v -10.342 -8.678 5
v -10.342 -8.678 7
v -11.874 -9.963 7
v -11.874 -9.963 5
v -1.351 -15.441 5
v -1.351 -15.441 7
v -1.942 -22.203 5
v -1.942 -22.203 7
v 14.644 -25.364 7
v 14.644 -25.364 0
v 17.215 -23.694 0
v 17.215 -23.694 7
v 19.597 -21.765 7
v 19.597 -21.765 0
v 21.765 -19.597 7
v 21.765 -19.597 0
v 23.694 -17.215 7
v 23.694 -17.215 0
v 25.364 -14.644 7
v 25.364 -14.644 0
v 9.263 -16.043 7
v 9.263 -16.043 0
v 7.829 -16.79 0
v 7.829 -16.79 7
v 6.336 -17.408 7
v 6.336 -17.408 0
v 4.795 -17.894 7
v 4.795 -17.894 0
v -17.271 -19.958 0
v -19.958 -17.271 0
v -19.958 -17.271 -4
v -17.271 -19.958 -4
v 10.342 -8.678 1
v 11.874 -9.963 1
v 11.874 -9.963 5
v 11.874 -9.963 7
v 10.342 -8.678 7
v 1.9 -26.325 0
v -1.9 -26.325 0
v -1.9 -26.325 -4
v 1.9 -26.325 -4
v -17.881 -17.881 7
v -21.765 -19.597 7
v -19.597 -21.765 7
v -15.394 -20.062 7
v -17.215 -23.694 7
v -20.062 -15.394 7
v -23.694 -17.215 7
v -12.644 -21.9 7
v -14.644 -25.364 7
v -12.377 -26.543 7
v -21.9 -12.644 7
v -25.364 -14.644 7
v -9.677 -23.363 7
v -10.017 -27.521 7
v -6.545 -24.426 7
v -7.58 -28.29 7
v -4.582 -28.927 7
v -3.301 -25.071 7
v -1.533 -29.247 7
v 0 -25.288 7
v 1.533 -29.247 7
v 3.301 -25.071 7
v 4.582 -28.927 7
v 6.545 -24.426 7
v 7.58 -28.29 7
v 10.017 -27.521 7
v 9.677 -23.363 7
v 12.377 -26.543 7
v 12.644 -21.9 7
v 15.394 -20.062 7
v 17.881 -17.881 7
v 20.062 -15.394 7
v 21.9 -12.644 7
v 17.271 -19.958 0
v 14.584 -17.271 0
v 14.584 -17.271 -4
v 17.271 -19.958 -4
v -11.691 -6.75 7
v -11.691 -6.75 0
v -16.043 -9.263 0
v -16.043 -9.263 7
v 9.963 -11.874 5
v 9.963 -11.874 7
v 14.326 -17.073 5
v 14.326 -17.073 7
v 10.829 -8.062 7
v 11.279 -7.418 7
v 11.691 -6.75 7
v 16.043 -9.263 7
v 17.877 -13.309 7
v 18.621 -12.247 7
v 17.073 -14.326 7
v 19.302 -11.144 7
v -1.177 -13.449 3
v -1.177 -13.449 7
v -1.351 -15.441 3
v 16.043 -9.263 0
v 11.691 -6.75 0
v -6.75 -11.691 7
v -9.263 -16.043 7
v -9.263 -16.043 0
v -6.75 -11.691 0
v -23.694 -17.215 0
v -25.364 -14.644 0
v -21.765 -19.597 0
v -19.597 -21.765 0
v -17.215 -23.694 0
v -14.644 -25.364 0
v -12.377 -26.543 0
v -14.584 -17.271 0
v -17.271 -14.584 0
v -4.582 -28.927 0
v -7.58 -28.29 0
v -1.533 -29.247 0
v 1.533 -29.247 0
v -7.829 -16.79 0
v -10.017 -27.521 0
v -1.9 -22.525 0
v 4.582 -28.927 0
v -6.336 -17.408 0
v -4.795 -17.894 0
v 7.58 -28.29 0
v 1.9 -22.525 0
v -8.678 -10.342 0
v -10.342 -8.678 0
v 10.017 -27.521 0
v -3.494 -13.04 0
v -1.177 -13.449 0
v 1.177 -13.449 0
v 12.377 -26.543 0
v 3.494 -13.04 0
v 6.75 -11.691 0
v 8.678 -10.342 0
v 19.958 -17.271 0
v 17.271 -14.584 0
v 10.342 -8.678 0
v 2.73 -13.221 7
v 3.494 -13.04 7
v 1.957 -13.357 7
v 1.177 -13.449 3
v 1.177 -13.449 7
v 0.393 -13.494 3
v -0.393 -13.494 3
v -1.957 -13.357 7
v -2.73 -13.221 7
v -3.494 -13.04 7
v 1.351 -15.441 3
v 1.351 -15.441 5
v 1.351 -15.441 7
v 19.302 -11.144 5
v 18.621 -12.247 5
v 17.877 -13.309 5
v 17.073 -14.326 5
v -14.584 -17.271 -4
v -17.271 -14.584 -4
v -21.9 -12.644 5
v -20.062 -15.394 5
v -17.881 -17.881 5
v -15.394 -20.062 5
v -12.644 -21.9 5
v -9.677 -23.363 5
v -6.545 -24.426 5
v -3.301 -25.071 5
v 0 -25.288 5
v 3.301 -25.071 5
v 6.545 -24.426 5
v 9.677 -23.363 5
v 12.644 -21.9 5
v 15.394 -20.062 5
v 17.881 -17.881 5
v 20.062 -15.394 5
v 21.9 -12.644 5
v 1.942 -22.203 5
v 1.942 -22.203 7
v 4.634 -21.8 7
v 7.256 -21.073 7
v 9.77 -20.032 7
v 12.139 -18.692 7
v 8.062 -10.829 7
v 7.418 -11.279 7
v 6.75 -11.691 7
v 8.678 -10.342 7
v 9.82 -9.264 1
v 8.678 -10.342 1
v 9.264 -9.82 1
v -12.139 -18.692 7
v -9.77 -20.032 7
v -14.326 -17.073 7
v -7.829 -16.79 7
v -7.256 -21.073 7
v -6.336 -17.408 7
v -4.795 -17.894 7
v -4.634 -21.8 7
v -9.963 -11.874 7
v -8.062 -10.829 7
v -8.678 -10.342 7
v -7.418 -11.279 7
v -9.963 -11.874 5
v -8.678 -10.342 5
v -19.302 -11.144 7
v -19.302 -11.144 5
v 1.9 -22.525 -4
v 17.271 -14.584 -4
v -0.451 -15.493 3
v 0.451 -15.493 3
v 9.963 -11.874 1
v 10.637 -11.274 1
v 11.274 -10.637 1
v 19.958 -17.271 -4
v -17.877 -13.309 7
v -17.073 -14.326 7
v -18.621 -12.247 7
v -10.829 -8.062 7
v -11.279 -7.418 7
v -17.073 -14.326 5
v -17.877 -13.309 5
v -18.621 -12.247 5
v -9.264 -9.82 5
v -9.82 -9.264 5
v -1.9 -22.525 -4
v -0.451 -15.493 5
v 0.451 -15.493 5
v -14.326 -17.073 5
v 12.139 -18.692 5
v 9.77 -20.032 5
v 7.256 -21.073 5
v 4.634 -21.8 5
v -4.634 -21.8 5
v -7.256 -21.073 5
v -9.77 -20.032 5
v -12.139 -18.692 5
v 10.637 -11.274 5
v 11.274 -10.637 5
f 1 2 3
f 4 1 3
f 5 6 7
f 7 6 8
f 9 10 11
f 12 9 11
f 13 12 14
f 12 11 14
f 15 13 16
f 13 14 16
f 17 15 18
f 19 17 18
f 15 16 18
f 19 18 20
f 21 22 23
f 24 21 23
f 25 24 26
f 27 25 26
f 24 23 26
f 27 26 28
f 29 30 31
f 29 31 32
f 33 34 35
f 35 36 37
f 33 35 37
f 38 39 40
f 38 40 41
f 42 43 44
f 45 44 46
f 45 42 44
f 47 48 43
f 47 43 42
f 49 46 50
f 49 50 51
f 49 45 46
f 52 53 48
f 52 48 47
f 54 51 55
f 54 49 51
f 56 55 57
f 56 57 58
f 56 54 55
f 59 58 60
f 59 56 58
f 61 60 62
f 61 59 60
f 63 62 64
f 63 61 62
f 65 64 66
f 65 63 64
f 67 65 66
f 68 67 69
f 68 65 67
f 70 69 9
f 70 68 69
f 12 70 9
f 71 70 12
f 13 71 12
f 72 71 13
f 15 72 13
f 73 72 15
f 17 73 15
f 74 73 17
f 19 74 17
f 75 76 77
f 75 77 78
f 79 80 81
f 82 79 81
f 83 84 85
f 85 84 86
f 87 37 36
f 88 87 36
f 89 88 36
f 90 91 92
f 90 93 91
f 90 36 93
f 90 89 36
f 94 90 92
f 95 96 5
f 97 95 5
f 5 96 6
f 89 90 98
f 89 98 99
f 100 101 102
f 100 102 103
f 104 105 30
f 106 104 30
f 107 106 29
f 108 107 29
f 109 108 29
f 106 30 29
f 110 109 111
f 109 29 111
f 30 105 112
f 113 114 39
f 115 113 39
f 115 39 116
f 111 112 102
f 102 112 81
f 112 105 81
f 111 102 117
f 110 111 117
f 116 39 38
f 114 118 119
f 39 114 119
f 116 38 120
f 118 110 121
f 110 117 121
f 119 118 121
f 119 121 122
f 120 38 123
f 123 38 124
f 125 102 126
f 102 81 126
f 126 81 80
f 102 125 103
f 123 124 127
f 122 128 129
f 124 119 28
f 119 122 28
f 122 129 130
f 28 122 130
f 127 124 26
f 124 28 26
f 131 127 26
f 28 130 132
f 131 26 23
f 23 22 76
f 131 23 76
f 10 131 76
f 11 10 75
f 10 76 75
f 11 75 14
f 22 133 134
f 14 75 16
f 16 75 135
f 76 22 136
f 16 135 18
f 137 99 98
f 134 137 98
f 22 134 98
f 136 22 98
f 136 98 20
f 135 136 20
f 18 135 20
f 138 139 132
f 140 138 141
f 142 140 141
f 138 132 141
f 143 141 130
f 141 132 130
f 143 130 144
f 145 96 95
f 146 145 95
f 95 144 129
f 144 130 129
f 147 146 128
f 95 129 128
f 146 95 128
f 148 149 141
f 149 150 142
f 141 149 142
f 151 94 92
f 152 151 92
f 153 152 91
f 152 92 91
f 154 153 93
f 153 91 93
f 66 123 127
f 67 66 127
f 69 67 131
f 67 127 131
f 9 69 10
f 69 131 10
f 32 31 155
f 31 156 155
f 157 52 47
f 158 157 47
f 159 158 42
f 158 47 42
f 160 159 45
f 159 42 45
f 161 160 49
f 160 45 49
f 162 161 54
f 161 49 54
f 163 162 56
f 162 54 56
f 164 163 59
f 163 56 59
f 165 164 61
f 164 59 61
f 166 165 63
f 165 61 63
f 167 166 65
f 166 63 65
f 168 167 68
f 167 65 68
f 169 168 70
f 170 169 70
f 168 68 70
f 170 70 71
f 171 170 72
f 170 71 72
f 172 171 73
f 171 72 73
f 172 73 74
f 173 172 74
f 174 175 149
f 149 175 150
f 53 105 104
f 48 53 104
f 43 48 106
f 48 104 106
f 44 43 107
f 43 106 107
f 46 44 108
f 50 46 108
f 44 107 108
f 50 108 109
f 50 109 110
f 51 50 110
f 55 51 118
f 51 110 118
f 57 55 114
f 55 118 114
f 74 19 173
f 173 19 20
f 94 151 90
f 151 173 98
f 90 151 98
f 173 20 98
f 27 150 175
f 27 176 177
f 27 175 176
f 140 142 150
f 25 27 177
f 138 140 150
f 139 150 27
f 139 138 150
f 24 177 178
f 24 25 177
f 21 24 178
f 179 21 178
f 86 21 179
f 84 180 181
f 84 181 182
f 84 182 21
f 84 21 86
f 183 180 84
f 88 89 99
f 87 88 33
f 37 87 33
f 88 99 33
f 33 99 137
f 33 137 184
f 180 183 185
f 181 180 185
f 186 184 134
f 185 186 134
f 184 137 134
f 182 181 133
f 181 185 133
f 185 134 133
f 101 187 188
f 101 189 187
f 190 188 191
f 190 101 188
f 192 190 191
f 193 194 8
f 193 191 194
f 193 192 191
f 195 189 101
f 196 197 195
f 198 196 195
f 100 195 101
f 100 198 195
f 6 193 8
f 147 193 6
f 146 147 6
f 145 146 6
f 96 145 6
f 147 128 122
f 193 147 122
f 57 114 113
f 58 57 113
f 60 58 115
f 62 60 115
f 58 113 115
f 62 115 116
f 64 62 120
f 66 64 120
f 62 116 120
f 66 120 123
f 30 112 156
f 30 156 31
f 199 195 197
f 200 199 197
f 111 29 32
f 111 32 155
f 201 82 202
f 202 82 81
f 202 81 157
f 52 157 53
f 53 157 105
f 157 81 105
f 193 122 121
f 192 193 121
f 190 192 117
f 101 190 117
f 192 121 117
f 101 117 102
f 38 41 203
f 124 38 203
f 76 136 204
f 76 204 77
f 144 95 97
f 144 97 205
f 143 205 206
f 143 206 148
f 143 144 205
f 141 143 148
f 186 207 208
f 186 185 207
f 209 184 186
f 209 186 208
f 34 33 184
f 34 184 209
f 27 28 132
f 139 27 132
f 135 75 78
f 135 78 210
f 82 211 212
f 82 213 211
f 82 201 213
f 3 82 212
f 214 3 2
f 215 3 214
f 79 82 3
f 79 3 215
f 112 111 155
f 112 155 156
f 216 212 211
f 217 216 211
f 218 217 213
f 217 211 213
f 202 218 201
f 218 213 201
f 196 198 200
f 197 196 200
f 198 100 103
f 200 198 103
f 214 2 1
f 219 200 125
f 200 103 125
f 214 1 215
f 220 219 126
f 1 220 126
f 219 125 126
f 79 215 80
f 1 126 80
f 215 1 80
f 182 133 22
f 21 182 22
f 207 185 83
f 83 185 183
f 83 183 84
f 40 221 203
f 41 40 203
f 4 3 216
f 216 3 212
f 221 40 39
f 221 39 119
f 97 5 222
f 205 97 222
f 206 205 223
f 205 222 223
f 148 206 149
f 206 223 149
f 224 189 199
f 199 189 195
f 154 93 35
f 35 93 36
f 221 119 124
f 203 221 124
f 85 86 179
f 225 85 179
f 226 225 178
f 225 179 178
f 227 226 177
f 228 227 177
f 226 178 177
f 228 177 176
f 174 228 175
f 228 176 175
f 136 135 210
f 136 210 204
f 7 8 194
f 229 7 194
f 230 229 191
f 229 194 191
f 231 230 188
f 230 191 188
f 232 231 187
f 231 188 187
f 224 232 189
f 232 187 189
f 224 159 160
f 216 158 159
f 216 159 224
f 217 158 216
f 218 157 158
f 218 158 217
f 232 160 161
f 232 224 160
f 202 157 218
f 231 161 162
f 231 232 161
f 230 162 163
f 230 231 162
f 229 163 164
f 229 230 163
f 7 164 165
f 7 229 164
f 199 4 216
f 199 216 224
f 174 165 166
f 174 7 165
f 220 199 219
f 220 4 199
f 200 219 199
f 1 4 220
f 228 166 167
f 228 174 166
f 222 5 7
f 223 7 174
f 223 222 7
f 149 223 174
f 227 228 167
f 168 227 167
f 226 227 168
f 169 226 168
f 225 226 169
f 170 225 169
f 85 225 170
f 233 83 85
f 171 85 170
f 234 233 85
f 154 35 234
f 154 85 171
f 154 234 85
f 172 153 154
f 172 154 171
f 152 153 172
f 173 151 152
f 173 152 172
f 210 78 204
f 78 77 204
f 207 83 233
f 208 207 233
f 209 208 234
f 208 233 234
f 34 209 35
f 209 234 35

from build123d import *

# Parameters (mm, degrees)
F0_W     = 3.8
F0_H     = 3.8
F0_R     = 1
F1_DEPTH = 7
F2_DEPTH = 4
F5_DEPTH = 2
F6_DEPTH = 2
F7_DEPTH = 4
F8_DEPTH = 6


with BuildPart() as f1:
    # F0 (on Top) → F1 (new body)
    with BuildSketch(Plane.XY):
        with BuildLine():
            ThreePointArc((14.6437525, -25.3637233435), (20.7093933895, -20.7093933895), (25.3637233435, -14.6437525))
            Line((25.3637233435, -14.6437525), (16.0434713454, -9.2627025))
            ThreePointArc((16.0434713454, -9.2627025), (13.0994394997, -13.0994394997), (9.2627025, -16.0434713454))
            Line((9.2627025, -16.0434713454), (14.6437525, -25.3637233435))
        make_face()
        Polygon((17.2713695087, -14.5843637402), (19.9583752772, -17.2713695087), (17.2713695087, -19.9583752772), (14.5843637402, -17.2713695087), align=None, mode=Mode.SUBTRACT)
        Polygon((17.2713695087, -19.9583752772), (19.9583752772, -17.2713695087), (17.2713695087, -14.5843637402), (14.5843637402, -17.2713695087), align=None)
        with BuildLine():
            ThreePointArc((9.2627025, -16.0434713454), (13.0994394997, -13.0994394997), (16.0434713454, -9.2627025))
            Line((16.0434713454, -9.2627025), (11.6913429511, -6.75))
            ThreePointArc((11.6913429511, -6.75), (9.545941546, -9.545941546), (6.75, -11.6913429511))
            Line((6.75, -11.6913429511), (9.2627025, -16.0434713454))
        make_face()
        with BuildLine():
            ThreePointArc((7.5801640775, -28.2895574671), (11.2078429388, -27.0581264278), (14.6437525, -25.3637233435))
            Line((14.6437525, -25.3637233435), (9.2627025, -16.0434713454))
            ThreePointArc((9.2627025, -16.0434713454), (7.0893655714, -17.115242511), (4.7947276322, -17.894167132))
            Line((4.7947276322, -17.894167132), (7.5801640775, -28.2895574671))
        make_face()
        with BuildLine():
            Line((-4.7947276322, -17.894167132), (-7.5801640775, -28.2895574671))
            ThreePointArc((-7.5801640775, -28.2895574671), (0, -29.287505), (7.5801640775, -28.2895574671))
            Line((7.5801640775, -28.2895574671), (4.7947276322, -17.894167132))
            ThreePointArc((4.7947276322, -17.894167132), (0, -18.525405), (-4.7947276322, -17.894167132))
        make_face()
        with Locations((0, -24.425405)):
            Rectangle(F0_W, F0_H, mode=Mode.SUBTRACT)
        with Locations((0, -24.425405)):
            Rectangle(F0_W, F0_H)
        with Locations((0, -24.425405)):
            Circle(F0_R, mode=Mode.SUBTRACT)
        with Locations((0, -24.425405)):
            Circle(F0_R)
        with BuildLine():
            Line((-3.4940571089, -13.0399986549), (-4.7947276322, -17.894167132))
            ThreePointArc((-4.7947276322, -17.894167132), (0, -18.525405), (4.7947276322, -17.894167132))
            Line((4.7947276322, -17.894167132), (3.4940571089, -13.0399986549))
            ThreePointArc((3.4940571089, -13.0399986549), (0, -13.5), (-3.4940571089, -13.0399986549))
        make_face()
        with BuildLine():
            Line((-9.2627025, -16.0434713454), (-14.6437525, -25.3637233435))
            ThreePointArc((-14.6437525, -25.3637233435), (-11.2078429388, -27.0581264278), (-7.5801640775, -28.2895574671))
            Line((-7.5801640775, -28.2895574671), (-4.7947276322, -17.894167132))
            ThreePointArc((-4.7947276322, -17.894167132), (-7.0893655714, -17.115242511), (-9.2627025, -16.0434713454))
        make_face()
        with BuildLine():
            Line((-16.0434713454, -9.2627025), (-25.3637233435, -14.6437525))
            ThreePointArc((-25.3637233435, -14.6437525), (-20.7093933895, -20.7093933895), (-14.6437525, -25.3637233435))
            Line((-14.6437525, -25.3637233435), (-9.2627025, -16.0434713454))
            ThreePointArc((-9.2627025, -16.0434713454), (-13.0994394997, -13.0994394997), (-16.0434713454, -9.2627025))
        make_face()
        Polygon((-14.5843637402, -17.2713695087), (-17.2713695087, -19.9583752772), (-19.9583752772, -17.2713695087), (-17.2713695087, -14.5843637402), align=None, mode=Mode.SUBTRACT)
        Polygon((-19.9583752772, -17.2713695087), (-17.2713695087, -19.9583752772), (-14.5843637402, -17.2713695087), (-17.2713695087, -14.5843637402), align=None)
        with BuildLine():
            Line((-11.6913429511, -6.75), (-16.0434713454, -9.2627025))
            ThreePointArc((-16.0434713454, -9.2627025), (-13.0994394997, -13.0994394997), (-9.2627025, -16.0434713454))
            Line((-9.2627025, -16.0434713454), (-6.75, -11.6913429511))
            ThreePointArc((-6.75, -11.6913429511), (-9.545941546, -9.545941546), (-11.6913429511, -6.75))
        make_face()
    extrude(amount=F1_DEPTH)

    # F0 (on Top) → F2 (join)
    with BuildSketch(Plane.XY):
        Polygon((17.2713695087, -19.9583752772), (19.9583752772, -17.2713695087), (17.2713695087, -14.5843637402), (14.5843637402, -17.2713695087), align=None)
        with Locations((0, -24.425405)):
            Rectangle(F0_W, F0_H)
        with Locations((0, -24.425405)):
            Circle(F0_R, mode=Mode.SUBTRACT)
        with Locations((0, -24.425405)):
            Circle(F0_R)
        Polygon((-19.9583752772, -17.2713695087), (-17.2713695087, -19.9583752772), (-14.5843637402, -17.2713695087), (-17.2713695087, -14.5843637402), align=None)
    extrude(amount=-F2_DEPTH)

    # F4 (on offset) → F5 (cut)
    with BuildSketch(Plane.XY.offset(7)):
        with BuildLine():
            Line((-11.8736888683, -9.9632079501), (-17.0732193562, -14.3261320648))
            ThreePointArc((-17.0732193562, -14.3261320648), (-15.7596459212, -15.7596459212), (-14.3261320648, -17.0732193562))
            Line((-14.3261320648, -17.0732193562), (-9.9632079501, -11.8736888683))
            ThreePointArc((-9.9632079501, -11.8736888683), (-10.9601551084, -10.9601551084), (-11.8736888683, -9.9632079501))
        make_face()
        with BuildLine():
            Line((-1.3509140126, -15.4410178204), (-1.9424840523, -22.2026943147))
            ThreePointArc((-1.9424840523, -22.2026943147), (0, -22.287505), (1.9424840523, -22.2026943147))
            Line((1.9424840523, -22.2026943147), (1.3509140126, -15.4410178204))
            ThreePointArc((1.3509140126, -15.4410178204), (0, -15.5), (-1.3509140126, -15.4410178204))
        make_face()
        with BuildLine():
            ThreePointArc((14.3261320648, -17.0732193562), (15.7596459212, -15.7596459212), (17.0732193562, -14.3261320648))
            Line((17.0732193562, -14.3261320648), (11.8736888683, -9.9632079501))
            ThreePointArc((11.8736888683, -9.9632079501), (10.9601551084, -10.9601551084), (9.9632079501, -11.8736888683))
            Line((9.9632079501, -11.8736888683), (14.3261320648, -17.0732193562))
        make_face()
        with BuildLine():
            Line((-19.301545517, -11.1437525), (-21.8996217283, -12.6437525))
            ThreePointArc((-21.8996217283, -12.6437525), (0, -25.287505), (21.8996217283, -12.6437525))
            Line((21.8996217283, -12.6437525), (19.301545517, -11.1437525))
            ThreePointArc((19.301545517, -11.1437525), (18.2568552829, -12.7835876931), (17.0732193562, -14.3261320648))
            ThreePointArc((17.0732193562, -14.3261320648), (15.7596459212, -15.7596459212), (14.3261320648, -17.0732193562))
            ThreePointArc((14.3261320648, -17.0732193562), (8.5290589123, -20.5909697002), (1.9424840523, -22.2026943147))
            ThreePointArc((1.9424840523, -22.2026943147), (0, -22.287505), (-1.9424840523, -22.2026943147))
            ThreePointArc((-1.9424840523, -22.2026943147), (-8.5290589123, -20.5909697002), (-14.3261320648, -17.0732193562))
            ThreePointArc((-14.3261320648, -17.0732193562), (-15.7596459212, -15.7596459212), (-17.0732193562, -14.3261320648))
            ThreePointArc((-17.0732193562, -14.3261320648), (-18.2568552829, -12.7835876931), (-19.301545517, -11.1437525))
        make_face()
    extrude(amount=-F5_DEPTH, mode=Mode.SUBTRACT)

    # F4 (on offset) → F6 (cut)
    with BuildSketch(Plane.XY.offset(7)):
        with BuildLine():
            Line((-10.3415999821, -8.6776327308), (-11.8736888683, -9.9632079501))
            ThreePointArc((-11.8736888683, -9.9632079501), (-10.9601551084, -10.9601551084), (-9.9632079501, -11.8736888683))
            Line((-9.9632079501, -11.8736888683), (-8.6776327308, -10.3415999821))
            ThreePointArc((-8.6776327308, -10.3415999821), (-9.545941546, -9.545941546), (-10.3415999821, -8.6776327308))
        make_face()
    extrude(amount=-F6_DEPTH, mode=Mode.SUBTRACT)

    # F4 (on offset) → F7 (cut)
    with BuildSketch(Plane.XY.offset(7)):
        with BuildLine():
            Line((-1.1766025271, -13.4486284242), (-1.3509140126, -15.4410178204))
            ThreePointArc((-1.3509140126, -15.4410178204), (0, -15.5), (1.3509140126, -15.4410178204))
            Line((1.3509140126, -15.4410178204), (1.1766025271, -13.4486284242))
            ThreePointArc((1.1766025271, -13.4486284242), (0, -13.5), (-1.1766025271, -13.4486284242))
        make_face()
    extrude(amount=-F7_DEPTH, mode=Mode.SUBTRACT)

    # F4 (on offset) → F8 (cut)
    with BuildSketch(Plane.XY.offset(7)):
        with BuildLine():
            ThreePointArc((9.9632079501, -11.8736888683), (10.9601551084, -10.9601551084), (11.8736888683, -9.9632079501))
            Line((11.8736888683, -9.9632079501), (10.3415999821, -8.6776327308))
            ThreePointArc((10.3415999821, -8.6776327308), (9.545941546, -9.545941546), (8.6776327308, -10.3415999821))
            Line((8.6776327308, -10.3415999821), (9.9632079501, -11.8736888683))
        make_face()
    extrude(amount=-F8_DEPTH, mode=Mode.SUBTRACT)


solid = f1.part
